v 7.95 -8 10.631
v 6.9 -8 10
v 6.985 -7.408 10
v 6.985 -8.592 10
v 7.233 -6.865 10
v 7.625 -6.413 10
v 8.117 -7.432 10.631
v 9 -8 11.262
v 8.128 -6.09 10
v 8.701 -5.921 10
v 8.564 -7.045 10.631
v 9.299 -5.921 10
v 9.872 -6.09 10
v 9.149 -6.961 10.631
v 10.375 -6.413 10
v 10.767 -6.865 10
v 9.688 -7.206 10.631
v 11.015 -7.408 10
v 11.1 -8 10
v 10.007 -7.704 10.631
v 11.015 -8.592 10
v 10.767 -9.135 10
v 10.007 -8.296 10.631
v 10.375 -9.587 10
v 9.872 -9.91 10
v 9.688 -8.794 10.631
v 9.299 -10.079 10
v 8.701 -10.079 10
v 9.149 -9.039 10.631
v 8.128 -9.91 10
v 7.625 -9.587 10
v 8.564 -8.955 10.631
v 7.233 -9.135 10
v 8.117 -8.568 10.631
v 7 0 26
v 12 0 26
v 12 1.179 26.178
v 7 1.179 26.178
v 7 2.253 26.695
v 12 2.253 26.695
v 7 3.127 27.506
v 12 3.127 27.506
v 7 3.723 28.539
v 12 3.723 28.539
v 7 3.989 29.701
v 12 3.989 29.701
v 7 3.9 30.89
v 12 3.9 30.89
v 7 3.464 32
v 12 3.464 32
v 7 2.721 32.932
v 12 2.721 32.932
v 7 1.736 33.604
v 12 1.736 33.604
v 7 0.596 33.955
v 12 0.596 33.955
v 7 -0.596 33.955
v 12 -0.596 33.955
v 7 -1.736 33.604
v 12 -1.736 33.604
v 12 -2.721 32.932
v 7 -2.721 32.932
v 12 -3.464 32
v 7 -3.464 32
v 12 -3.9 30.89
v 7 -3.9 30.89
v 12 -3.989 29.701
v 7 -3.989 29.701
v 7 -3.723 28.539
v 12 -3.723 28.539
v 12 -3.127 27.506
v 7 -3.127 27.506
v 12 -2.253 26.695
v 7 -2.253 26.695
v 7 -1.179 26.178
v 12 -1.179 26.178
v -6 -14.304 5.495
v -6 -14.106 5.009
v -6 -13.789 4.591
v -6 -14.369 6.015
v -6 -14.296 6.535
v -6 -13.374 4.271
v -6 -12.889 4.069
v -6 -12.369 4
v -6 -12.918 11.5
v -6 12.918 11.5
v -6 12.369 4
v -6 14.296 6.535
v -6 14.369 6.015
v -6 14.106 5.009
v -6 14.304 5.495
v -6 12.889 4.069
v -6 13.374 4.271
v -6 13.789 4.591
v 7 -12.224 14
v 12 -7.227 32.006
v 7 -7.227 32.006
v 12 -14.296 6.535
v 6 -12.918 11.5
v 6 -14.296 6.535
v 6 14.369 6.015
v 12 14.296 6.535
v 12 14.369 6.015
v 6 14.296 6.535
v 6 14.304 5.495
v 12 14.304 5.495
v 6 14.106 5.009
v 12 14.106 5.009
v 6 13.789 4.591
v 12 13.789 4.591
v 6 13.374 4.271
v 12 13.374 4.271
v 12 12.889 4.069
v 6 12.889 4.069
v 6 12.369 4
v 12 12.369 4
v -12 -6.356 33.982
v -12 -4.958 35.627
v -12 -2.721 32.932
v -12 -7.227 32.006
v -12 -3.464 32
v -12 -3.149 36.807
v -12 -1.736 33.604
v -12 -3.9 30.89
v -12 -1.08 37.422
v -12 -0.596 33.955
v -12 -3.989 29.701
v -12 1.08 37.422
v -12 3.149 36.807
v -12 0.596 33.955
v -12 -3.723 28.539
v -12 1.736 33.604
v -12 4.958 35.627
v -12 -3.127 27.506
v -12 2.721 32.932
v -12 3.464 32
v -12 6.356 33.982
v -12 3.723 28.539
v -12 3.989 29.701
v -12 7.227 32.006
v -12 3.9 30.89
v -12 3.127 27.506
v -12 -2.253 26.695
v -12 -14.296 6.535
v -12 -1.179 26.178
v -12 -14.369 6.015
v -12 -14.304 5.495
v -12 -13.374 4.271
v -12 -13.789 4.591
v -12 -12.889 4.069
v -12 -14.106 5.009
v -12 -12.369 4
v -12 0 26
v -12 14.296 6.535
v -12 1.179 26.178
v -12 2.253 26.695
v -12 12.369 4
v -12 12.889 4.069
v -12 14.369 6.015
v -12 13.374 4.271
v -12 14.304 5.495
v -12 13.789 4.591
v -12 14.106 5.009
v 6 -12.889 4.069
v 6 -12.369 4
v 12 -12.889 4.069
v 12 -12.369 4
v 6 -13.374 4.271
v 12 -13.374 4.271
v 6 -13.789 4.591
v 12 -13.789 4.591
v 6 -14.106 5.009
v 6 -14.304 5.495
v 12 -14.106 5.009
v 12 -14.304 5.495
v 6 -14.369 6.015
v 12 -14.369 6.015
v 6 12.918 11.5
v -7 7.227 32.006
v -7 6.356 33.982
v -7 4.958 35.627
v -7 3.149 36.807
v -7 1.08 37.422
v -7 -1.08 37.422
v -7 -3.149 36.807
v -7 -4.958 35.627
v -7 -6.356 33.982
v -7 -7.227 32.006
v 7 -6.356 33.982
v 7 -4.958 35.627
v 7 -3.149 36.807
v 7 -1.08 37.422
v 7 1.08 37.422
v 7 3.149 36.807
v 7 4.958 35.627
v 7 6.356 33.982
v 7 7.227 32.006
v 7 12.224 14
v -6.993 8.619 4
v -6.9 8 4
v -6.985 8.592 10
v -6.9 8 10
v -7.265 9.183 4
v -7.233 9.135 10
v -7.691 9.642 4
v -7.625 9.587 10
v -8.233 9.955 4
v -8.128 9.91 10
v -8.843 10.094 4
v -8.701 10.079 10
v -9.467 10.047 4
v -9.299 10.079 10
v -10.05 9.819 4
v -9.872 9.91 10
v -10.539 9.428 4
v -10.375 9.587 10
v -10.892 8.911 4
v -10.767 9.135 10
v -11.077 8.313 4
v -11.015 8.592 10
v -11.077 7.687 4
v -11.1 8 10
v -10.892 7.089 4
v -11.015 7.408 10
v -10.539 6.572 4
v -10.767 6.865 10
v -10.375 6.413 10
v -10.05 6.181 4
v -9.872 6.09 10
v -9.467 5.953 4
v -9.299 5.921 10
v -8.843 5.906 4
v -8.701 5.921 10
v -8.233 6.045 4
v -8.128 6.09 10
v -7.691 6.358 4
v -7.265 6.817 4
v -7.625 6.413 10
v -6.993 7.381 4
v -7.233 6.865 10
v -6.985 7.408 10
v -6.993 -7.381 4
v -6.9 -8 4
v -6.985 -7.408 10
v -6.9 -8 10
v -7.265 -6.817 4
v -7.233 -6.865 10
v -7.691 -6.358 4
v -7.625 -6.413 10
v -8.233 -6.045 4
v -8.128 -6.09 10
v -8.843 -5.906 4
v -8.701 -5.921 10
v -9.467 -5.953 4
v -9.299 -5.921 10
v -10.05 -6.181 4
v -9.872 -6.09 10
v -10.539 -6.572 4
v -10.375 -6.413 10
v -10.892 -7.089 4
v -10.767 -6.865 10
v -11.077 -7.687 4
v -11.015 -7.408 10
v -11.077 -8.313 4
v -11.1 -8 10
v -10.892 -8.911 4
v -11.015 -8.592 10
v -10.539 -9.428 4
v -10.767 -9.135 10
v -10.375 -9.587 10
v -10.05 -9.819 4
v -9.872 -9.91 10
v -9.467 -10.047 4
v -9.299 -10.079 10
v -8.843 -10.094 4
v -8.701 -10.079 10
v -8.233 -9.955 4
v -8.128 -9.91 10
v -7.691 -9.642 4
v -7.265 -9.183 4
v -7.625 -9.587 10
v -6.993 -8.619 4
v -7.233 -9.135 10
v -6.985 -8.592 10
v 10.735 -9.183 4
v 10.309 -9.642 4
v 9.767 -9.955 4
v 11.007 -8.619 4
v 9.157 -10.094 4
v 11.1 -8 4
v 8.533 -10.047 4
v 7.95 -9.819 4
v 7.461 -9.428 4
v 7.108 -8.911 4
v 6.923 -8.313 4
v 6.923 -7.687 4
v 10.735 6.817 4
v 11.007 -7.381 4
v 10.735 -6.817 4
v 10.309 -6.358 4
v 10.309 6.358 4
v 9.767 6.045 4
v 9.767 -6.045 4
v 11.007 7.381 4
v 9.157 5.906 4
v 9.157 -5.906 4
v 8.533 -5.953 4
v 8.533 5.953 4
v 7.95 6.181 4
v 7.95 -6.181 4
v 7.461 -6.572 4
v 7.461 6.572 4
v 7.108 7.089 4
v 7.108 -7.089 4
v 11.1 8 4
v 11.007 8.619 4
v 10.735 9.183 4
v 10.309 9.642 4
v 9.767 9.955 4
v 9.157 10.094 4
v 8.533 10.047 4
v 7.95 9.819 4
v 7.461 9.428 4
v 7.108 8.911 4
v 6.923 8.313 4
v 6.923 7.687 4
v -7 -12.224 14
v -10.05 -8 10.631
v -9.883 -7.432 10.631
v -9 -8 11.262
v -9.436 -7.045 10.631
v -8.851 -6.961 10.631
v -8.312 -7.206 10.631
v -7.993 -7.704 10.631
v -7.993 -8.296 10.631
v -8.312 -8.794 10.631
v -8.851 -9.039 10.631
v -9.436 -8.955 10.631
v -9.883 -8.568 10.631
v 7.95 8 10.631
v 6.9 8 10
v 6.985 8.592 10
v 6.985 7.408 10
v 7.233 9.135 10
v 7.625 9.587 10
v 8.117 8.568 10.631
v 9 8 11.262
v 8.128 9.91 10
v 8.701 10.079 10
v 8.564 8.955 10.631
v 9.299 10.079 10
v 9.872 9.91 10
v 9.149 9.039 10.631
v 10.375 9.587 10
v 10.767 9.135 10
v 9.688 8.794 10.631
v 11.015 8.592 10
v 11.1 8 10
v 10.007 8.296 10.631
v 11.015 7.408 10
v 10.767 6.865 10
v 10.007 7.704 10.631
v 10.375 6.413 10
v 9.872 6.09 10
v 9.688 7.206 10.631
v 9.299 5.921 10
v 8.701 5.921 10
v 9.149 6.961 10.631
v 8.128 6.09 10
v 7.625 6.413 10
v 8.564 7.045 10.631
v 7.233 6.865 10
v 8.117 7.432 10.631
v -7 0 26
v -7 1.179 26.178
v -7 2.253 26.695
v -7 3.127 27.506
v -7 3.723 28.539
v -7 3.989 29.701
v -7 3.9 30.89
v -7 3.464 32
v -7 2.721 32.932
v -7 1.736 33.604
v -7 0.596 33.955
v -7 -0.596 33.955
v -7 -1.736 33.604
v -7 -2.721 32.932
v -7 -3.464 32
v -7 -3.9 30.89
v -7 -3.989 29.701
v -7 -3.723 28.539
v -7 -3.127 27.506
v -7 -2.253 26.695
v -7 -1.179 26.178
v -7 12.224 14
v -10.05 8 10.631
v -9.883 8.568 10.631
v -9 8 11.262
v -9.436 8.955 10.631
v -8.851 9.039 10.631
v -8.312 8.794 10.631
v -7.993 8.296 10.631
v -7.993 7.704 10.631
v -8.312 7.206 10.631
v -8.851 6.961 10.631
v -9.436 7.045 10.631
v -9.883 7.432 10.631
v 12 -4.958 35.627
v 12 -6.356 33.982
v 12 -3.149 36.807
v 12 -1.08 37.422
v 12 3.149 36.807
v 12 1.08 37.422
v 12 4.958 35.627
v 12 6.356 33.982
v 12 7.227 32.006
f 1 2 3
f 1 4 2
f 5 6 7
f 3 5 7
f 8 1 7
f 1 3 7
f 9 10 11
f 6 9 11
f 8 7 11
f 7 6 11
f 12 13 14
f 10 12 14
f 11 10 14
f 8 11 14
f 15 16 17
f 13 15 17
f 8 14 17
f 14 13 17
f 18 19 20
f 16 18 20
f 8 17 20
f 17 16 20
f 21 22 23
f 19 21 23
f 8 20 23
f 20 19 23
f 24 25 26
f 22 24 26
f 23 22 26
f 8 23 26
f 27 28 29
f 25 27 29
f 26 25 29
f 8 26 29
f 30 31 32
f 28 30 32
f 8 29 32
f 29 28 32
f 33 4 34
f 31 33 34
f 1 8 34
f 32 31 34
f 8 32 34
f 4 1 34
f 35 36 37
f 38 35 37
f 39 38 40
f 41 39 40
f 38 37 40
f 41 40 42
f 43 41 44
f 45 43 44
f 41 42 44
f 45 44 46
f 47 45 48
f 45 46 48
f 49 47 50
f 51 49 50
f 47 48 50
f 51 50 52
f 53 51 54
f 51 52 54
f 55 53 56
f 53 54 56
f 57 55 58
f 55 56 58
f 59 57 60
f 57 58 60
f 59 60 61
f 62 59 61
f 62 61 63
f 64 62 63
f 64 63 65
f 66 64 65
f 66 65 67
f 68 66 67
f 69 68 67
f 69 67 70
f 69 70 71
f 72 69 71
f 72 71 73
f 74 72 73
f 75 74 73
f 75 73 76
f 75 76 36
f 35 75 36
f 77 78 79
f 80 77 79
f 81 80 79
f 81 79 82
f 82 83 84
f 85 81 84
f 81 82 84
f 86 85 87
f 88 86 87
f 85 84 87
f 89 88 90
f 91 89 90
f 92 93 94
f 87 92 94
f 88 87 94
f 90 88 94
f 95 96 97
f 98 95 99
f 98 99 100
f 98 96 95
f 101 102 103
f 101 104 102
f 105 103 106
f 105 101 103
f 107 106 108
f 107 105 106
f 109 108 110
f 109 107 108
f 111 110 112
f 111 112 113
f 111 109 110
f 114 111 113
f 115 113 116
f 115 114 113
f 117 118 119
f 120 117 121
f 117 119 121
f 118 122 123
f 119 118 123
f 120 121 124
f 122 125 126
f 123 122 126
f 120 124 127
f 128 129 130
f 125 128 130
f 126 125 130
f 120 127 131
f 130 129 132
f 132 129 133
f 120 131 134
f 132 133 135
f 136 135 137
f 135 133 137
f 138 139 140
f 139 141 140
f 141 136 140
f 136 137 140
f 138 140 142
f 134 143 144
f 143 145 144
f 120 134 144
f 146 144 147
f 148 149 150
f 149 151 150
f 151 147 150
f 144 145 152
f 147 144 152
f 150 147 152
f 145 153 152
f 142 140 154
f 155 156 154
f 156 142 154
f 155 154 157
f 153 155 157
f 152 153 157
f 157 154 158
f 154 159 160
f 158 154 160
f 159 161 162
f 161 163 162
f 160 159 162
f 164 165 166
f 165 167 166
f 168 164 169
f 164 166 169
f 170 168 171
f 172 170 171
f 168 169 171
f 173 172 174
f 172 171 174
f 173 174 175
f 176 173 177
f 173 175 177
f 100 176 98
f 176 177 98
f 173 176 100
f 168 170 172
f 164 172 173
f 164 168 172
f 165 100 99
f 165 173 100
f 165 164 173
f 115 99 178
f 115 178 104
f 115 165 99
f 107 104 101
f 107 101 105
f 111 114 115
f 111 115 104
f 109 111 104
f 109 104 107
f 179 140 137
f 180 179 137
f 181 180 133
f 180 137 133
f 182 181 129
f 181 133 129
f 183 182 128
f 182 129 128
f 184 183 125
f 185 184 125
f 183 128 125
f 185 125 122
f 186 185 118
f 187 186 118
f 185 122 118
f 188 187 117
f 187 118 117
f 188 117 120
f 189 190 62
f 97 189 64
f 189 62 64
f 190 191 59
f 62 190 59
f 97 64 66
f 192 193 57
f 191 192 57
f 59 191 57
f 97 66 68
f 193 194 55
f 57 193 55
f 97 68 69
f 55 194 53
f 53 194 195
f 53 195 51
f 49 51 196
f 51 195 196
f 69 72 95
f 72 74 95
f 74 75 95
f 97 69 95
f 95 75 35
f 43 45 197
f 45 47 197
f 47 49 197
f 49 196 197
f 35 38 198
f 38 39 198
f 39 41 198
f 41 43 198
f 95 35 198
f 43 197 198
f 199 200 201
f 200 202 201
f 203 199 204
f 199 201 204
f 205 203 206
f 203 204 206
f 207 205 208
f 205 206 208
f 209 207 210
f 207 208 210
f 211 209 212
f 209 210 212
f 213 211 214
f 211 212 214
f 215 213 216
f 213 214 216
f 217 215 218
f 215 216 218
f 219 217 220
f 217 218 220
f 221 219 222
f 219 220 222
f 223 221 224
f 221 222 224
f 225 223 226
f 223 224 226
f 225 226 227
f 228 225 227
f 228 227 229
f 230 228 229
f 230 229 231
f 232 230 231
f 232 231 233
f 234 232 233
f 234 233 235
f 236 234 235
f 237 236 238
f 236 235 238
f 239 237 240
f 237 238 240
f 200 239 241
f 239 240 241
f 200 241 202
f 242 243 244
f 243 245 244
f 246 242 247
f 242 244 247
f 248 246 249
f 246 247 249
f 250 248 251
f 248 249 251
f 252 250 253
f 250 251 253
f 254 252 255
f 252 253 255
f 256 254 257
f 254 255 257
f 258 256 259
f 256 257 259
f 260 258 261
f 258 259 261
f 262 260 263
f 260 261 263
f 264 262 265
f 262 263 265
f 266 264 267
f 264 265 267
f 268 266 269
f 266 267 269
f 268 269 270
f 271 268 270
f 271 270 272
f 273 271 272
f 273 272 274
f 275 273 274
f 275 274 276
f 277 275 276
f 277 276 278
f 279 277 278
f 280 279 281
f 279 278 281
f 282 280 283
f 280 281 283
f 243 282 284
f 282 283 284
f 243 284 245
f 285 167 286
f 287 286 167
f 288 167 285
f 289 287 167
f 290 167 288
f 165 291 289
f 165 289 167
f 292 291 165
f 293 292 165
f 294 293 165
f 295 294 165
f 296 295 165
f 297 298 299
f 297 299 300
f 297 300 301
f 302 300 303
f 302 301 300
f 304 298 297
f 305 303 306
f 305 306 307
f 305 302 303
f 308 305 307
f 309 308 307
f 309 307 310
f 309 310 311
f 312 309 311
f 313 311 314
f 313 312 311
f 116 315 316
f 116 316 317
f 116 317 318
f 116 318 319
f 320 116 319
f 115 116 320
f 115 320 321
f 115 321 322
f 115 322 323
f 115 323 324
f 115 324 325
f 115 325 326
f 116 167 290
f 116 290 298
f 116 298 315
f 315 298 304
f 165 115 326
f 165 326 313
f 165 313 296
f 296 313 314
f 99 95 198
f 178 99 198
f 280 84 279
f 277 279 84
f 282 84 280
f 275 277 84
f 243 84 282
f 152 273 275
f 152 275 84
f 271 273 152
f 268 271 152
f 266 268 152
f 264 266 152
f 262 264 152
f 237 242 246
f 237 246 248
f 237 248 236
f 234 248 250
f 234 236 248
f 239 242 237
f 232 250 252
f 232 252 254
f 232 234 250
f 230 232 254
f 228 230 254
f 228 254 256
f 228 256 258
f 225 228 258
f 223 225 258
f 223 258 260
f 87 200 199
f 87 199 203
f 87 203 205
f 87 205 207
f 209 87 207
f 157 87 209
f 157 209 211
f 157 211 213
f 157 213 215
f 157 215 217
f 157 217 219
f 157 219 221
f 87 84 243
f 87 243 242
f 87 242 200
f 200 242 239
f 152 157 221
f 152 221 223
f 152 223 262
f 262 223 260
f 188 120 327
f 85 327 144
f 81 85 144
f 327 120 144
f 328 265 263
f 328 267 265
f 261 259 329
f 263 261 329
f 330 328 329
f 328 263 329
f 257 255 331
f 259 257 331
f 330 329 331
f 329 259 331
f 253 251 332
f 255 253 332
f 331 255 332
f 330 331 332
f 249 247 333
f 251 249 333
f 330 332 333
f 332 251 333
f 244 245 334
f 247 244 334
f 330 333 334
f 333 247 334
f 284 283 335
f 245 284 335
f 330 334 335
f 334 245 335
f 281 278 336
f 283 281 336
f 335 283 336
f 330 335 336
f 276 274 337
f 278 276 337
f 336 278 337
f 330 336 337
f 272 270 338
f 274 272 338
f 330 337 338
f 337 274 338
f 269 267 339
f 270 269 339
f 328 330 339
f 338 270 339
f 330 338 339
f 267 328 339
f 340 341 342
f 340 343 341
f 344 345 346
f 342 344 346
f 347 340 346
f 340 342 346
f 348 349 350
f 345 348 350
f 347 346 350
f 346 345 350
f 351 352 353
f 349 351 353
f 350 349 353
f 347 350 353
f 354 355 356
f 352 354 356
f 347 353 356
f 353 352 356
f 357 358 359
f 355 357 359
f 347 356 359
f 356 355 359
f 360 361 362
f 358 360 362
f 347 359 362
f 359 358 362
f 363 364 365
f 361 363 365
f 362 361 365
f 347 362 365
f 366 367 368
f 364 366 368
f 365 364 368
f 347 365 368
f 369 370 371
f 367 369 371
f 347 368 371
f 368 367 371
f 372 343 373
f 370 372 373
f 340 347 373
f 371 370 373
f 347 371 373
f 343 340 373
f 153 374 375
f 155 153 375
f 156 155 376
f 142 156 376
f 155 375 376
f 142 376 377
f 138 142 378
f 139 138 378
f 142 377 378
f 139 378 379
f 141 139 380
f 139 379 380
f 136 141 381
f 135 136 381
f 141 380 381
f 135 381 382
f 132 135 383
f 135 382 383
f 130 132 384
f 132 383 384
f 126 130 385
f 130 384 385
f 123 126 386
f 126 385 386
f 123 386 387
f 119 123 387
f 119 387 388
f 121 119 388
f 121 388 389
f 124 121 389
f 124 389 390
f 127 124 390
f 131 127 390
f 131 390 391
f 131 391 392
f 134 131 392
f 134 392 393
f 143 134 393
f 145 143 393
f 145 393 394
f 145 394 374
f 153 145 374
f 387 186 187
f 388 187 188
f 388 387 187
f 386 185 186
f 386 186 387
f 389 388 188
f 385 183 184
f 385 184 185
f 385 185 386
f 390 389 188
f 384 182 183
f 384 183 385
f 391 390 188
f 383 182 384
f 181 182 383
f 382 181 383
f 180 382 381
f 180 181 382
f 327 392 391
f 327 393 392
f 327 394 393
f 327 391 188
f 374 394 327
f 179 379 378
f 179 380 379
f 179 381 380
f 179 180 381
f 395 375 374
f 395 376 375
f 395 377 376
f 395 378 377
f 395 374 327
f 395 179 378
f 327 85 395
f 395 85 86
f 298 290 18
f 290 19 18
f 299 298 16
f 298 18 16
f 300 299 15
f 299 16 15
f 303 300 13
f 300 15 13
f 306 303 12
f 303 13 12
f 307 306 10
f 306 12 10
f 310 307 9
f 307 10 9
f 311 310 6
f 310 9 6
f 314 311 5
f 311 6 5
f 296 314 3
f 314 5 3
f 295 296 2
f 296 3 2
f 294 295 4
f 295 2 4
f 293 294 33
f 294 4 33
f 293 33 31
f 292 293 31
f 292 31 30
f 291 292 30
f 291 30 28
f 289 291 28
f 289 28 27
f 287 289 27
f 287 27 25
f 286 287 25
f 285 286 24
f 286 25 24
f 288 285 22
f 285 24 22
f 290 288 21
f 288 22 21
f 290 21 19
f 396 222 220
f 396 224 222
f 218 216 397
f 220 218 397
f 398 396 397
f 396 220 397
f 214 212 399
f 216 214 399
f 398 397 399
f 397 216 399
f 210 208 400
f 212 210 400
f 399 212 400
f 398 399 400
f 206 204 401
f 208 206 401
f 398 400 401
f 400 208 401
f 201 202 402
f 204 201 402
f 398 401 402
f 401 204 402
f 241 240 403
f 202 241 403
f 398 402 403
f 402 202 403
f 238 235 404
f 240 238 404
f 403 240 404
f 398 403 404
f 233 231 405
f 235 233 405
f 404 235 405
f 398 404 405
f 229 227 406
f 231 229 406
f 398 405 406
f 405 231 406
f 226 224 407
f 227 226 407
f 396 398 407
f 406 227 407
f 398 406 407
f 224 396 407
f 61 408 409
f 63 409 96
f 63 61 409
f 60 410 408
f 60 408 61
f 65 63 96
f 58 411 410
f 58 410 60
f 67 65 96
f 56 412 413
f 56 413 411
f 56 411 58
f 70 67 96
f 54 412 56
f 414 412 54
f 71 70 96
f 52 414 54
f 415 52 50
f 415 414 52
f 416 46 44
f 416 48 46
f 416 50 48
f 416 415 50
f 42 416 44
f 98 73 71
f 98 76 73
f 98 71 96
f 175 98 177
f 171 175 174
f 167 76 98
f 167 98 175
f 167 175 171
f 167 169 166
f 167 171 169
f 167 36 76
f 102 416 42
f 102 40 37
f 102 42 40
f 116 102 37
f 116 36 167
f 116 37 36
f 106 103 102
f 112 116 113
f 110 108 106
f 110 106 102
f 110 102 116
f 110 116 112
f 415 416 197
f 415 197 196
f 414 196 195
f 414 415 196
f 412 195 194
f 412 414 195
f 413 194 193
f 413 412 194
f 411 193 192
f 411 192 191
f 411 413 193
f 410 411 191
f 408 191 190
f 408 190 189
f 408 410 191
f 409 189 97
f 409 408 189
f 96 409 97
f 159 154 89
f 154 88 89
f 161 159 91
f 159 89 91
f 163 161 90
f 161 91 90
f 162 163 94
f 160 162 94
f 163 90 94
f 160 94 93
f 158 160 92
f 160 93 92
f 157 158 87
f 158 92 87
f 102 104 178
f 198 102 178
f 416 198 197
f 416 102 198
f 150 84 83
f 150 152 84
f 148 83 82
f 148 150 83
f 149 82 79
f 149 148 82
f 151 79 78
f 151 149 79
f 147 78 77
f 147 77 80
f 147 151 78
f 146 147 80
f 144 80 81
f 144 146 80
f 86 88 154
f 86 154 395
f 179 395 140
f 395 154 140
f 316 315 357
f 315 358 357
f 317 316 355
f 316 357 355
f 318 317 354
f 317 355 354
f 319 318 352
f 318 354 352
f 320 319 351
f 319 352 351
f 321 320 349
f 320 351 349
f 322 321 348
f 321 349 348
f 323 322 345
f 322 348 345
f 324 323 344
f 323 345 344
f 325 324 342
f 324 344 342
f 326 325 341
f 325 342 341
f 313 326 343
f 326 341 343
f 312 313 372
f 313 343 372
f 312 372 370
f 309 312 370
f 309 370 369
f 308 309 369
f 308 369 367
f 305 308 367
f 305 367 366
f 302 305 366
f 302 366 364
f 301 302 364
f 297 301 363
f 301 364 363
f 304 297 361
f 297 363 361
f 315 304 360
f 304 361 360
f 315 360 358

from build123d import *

# Parameters (mm, degrees)
SKETCH_1_W             = 24
SKETCH_1_H             = 30
EXTRUDE_1_DEPTH        = 4
EXTRUDE_2_DEPTH        = 5
EXTRUDE_START          = -24
EXTRUDE_3_DEPTH        = 5
HOLE_WIZARD_M6_1_D     = 5
HOLE_WIZARD_M6_1_DEPTH = 5
SKETCH_13_R            = 4
CUT_EXTRUDE_1_DEPTH    = 25
CHAMFER_1_SIZE         = 4
CHAMFER_1_SIZE2        = 10
CHAMFER_2_SIZE         = 10
CHAMFER_2_SIZE2        = 4
HOLE_WIZARD_M5_1_D     = 4.2
HOLE_WIZARD_M5_1_DEPTH = 10
HOLE_WIZARD_M5_1_TIP   = 1.2618073
SKETCH_15_W            = 12
SKETCH_15_H            = 30
CUT_EXTRUDE_2_DEPTH    = 38.5
SKETCH_16_W            = 24
SKETCH_16_H            = 30
CUT_EXTRUDE_3_DEPTH    = 4
FILLET_1_R             = 2
FILLET_2_R             = 2


with BuildPart() as part:
    # 草图1 → 凸台-拉伸1 (new body)
    with BuildSketch(Plane.XY):
        Rectangle(SKETCH_1_W, SKETCH_1_H)
    extrude(amount=EXTRUDE_1_DEPTH)

    # 草图4 → 凸台-拉伸2 (add)
    with BuildSketch(Plane.ZY.offset(12)):
        with BuildLine():
            Line((4, 15), (32.005844192, 7.226796599))
            ThreePointArc((32.005844192, 7.226796599), (37.5, 0), (32.005844192, -7.226796599))
            Line((32.005844192, -7.226796599), (4, -15))
            Line((4, -15), (4, 15))
        make_face()
    extrude(amount=-EXTRUDE_2_DEPTH)

    # 草图4<2> → 凸台-拉伸3 (add)
    with BuildSketch(Plane.ZY.offset(12).offset(EXTRUDE_START)):
        with BuildLine():
            Line((4, 15), (32.005844192, 7.226796599))
            ThreePointArc((32.005844192, 7.226796599), (37.5, 0), (32.005844192, -7.226796599))
            Line((32.005844192, -7.226796599), (4, -15))
            Line((4, -15), (4, 15))
        make_face()
    extrude(amount=EXTRUDE_3_DEPTH)

    # M6 螺纹孔1
    with Locations(Plane(origin=(-12, 0, 30), x_dir=(0, -1, 0), z_dir=(-1, 0, 0))):
        with Locations((0, 0)):
            Hole(HOLE_WIZARD_M6_1_D / 2, depth=HOLE_WIZARD_M6_1_DEPTH)

    # 草图13 → 切除-拉伸1 (cut, through all)
    with BuildSketch(Plane(origin=(12, 0, 0), x_dir=(0, 0, -1), z_dir=(1, 0, 0))):
        with Locations((-30, 0)):
            Circle(SKETCH_13_R)
    extrude(amount=-CUT_EXTRUDE_1_DEPTH, mode=Mode.SUBTRACT)

    # 倒角1
    chamfer_1_edges = [part.edges().sort_by_distance(p)[0] for p in [
        (7, 0, 4),
    ]]
    chamfer_1_side = [part.faces().sort_by_distance(p)[0] for p in [
        (0, 0, 4),
    ]]
    chamfer(chamfer_1_edges, length=CHAMFER_1_SIZE, length2=CHAMFER_1_SIZE2, reference=chamfer_1_side[0])

    # 倒角2
    chamfer_2_edges = [part.edges().sort_by_distance(p)[0] for p in [
        (-7, 0, 4),
    ]]
    chamfer_2_side = [part.faces().sort_by_distance(p)[0] for p in [
        (-7, 0, 16.950170632),
    ]]
    chamfer(chamfer_2_edges, length=CHAMFER_2_SIZE, length2=CHAMFER_2_SIZE2, reference=chamfer_2_side[0])

    # M5 螺纹孔1
    with Locations(Plane(origin=(0, 0, 0), x_dir=(-1, 0, 0), z_dir=(0, 0, -1))):
        with Locations((-9, 8), (9, 8), (9, -8), (-9, -8)):
            Hole(HOLE_WIZARD_M5_1_D / 2, depth=HOLE_WIZARD_M5_1_DEPTH)
            with Locations((0, 0, -(HOLE_WIZARD_M5_1_DEPTH + HOLE_WIZARD_M5_1_TIP / 2))):  # 118° drill point
                Cone(0, HOLE_WIZARD_M5_1_D / 2, HOLE_WIZARD_M5_1_TIP, mode=Mode.SUBTRACT)

    # 草图15 → 切除-拉伸2 (cut, through all)
    with BuildSketch(Plane(origin=(0, 0, 0), x_dir=(-1, 0, 0), z_dir=(0, 0, -1))):
        Rectangle(SKETCH_15_W, SKETCH_15_H)
    extrude(amount=-CUT_EXTRUDE_2_DEPTH, mode=Mode.SUBTRACT)

    # 草图16 → 切除-拉伸3 (cut)
    with BuildSketch(Plane(origin=(0, 0, 0), x_dir=(-1, 0, 0), z_dir=(0, 0, -1))):
        Rectangle(SKETCH_16_W, SKETCH_16_H)
    extrude(amount=-CUT_EXTRUDE_3_DEPTH, mode=Mode.SUBTRACT)

    # 圆角1
    fillet_1_edges = [part.edges().sort_by_distance(p)[0] for p in [
        (-9, 15, 4),
        (-9, -15, 4),
    ]]
    fillet(fillet_1_edges, radius=FILLET_1_R)

    # 圆角2
    fillet_2_edges = [part.edges().sort_by_distance(p)[0] for p in [
        (9, -15, 4),
        (9, 15, 4),
    ]]
    fillet(fillet_2_edges, radius=FILLET_2_R)


solid = part.part
